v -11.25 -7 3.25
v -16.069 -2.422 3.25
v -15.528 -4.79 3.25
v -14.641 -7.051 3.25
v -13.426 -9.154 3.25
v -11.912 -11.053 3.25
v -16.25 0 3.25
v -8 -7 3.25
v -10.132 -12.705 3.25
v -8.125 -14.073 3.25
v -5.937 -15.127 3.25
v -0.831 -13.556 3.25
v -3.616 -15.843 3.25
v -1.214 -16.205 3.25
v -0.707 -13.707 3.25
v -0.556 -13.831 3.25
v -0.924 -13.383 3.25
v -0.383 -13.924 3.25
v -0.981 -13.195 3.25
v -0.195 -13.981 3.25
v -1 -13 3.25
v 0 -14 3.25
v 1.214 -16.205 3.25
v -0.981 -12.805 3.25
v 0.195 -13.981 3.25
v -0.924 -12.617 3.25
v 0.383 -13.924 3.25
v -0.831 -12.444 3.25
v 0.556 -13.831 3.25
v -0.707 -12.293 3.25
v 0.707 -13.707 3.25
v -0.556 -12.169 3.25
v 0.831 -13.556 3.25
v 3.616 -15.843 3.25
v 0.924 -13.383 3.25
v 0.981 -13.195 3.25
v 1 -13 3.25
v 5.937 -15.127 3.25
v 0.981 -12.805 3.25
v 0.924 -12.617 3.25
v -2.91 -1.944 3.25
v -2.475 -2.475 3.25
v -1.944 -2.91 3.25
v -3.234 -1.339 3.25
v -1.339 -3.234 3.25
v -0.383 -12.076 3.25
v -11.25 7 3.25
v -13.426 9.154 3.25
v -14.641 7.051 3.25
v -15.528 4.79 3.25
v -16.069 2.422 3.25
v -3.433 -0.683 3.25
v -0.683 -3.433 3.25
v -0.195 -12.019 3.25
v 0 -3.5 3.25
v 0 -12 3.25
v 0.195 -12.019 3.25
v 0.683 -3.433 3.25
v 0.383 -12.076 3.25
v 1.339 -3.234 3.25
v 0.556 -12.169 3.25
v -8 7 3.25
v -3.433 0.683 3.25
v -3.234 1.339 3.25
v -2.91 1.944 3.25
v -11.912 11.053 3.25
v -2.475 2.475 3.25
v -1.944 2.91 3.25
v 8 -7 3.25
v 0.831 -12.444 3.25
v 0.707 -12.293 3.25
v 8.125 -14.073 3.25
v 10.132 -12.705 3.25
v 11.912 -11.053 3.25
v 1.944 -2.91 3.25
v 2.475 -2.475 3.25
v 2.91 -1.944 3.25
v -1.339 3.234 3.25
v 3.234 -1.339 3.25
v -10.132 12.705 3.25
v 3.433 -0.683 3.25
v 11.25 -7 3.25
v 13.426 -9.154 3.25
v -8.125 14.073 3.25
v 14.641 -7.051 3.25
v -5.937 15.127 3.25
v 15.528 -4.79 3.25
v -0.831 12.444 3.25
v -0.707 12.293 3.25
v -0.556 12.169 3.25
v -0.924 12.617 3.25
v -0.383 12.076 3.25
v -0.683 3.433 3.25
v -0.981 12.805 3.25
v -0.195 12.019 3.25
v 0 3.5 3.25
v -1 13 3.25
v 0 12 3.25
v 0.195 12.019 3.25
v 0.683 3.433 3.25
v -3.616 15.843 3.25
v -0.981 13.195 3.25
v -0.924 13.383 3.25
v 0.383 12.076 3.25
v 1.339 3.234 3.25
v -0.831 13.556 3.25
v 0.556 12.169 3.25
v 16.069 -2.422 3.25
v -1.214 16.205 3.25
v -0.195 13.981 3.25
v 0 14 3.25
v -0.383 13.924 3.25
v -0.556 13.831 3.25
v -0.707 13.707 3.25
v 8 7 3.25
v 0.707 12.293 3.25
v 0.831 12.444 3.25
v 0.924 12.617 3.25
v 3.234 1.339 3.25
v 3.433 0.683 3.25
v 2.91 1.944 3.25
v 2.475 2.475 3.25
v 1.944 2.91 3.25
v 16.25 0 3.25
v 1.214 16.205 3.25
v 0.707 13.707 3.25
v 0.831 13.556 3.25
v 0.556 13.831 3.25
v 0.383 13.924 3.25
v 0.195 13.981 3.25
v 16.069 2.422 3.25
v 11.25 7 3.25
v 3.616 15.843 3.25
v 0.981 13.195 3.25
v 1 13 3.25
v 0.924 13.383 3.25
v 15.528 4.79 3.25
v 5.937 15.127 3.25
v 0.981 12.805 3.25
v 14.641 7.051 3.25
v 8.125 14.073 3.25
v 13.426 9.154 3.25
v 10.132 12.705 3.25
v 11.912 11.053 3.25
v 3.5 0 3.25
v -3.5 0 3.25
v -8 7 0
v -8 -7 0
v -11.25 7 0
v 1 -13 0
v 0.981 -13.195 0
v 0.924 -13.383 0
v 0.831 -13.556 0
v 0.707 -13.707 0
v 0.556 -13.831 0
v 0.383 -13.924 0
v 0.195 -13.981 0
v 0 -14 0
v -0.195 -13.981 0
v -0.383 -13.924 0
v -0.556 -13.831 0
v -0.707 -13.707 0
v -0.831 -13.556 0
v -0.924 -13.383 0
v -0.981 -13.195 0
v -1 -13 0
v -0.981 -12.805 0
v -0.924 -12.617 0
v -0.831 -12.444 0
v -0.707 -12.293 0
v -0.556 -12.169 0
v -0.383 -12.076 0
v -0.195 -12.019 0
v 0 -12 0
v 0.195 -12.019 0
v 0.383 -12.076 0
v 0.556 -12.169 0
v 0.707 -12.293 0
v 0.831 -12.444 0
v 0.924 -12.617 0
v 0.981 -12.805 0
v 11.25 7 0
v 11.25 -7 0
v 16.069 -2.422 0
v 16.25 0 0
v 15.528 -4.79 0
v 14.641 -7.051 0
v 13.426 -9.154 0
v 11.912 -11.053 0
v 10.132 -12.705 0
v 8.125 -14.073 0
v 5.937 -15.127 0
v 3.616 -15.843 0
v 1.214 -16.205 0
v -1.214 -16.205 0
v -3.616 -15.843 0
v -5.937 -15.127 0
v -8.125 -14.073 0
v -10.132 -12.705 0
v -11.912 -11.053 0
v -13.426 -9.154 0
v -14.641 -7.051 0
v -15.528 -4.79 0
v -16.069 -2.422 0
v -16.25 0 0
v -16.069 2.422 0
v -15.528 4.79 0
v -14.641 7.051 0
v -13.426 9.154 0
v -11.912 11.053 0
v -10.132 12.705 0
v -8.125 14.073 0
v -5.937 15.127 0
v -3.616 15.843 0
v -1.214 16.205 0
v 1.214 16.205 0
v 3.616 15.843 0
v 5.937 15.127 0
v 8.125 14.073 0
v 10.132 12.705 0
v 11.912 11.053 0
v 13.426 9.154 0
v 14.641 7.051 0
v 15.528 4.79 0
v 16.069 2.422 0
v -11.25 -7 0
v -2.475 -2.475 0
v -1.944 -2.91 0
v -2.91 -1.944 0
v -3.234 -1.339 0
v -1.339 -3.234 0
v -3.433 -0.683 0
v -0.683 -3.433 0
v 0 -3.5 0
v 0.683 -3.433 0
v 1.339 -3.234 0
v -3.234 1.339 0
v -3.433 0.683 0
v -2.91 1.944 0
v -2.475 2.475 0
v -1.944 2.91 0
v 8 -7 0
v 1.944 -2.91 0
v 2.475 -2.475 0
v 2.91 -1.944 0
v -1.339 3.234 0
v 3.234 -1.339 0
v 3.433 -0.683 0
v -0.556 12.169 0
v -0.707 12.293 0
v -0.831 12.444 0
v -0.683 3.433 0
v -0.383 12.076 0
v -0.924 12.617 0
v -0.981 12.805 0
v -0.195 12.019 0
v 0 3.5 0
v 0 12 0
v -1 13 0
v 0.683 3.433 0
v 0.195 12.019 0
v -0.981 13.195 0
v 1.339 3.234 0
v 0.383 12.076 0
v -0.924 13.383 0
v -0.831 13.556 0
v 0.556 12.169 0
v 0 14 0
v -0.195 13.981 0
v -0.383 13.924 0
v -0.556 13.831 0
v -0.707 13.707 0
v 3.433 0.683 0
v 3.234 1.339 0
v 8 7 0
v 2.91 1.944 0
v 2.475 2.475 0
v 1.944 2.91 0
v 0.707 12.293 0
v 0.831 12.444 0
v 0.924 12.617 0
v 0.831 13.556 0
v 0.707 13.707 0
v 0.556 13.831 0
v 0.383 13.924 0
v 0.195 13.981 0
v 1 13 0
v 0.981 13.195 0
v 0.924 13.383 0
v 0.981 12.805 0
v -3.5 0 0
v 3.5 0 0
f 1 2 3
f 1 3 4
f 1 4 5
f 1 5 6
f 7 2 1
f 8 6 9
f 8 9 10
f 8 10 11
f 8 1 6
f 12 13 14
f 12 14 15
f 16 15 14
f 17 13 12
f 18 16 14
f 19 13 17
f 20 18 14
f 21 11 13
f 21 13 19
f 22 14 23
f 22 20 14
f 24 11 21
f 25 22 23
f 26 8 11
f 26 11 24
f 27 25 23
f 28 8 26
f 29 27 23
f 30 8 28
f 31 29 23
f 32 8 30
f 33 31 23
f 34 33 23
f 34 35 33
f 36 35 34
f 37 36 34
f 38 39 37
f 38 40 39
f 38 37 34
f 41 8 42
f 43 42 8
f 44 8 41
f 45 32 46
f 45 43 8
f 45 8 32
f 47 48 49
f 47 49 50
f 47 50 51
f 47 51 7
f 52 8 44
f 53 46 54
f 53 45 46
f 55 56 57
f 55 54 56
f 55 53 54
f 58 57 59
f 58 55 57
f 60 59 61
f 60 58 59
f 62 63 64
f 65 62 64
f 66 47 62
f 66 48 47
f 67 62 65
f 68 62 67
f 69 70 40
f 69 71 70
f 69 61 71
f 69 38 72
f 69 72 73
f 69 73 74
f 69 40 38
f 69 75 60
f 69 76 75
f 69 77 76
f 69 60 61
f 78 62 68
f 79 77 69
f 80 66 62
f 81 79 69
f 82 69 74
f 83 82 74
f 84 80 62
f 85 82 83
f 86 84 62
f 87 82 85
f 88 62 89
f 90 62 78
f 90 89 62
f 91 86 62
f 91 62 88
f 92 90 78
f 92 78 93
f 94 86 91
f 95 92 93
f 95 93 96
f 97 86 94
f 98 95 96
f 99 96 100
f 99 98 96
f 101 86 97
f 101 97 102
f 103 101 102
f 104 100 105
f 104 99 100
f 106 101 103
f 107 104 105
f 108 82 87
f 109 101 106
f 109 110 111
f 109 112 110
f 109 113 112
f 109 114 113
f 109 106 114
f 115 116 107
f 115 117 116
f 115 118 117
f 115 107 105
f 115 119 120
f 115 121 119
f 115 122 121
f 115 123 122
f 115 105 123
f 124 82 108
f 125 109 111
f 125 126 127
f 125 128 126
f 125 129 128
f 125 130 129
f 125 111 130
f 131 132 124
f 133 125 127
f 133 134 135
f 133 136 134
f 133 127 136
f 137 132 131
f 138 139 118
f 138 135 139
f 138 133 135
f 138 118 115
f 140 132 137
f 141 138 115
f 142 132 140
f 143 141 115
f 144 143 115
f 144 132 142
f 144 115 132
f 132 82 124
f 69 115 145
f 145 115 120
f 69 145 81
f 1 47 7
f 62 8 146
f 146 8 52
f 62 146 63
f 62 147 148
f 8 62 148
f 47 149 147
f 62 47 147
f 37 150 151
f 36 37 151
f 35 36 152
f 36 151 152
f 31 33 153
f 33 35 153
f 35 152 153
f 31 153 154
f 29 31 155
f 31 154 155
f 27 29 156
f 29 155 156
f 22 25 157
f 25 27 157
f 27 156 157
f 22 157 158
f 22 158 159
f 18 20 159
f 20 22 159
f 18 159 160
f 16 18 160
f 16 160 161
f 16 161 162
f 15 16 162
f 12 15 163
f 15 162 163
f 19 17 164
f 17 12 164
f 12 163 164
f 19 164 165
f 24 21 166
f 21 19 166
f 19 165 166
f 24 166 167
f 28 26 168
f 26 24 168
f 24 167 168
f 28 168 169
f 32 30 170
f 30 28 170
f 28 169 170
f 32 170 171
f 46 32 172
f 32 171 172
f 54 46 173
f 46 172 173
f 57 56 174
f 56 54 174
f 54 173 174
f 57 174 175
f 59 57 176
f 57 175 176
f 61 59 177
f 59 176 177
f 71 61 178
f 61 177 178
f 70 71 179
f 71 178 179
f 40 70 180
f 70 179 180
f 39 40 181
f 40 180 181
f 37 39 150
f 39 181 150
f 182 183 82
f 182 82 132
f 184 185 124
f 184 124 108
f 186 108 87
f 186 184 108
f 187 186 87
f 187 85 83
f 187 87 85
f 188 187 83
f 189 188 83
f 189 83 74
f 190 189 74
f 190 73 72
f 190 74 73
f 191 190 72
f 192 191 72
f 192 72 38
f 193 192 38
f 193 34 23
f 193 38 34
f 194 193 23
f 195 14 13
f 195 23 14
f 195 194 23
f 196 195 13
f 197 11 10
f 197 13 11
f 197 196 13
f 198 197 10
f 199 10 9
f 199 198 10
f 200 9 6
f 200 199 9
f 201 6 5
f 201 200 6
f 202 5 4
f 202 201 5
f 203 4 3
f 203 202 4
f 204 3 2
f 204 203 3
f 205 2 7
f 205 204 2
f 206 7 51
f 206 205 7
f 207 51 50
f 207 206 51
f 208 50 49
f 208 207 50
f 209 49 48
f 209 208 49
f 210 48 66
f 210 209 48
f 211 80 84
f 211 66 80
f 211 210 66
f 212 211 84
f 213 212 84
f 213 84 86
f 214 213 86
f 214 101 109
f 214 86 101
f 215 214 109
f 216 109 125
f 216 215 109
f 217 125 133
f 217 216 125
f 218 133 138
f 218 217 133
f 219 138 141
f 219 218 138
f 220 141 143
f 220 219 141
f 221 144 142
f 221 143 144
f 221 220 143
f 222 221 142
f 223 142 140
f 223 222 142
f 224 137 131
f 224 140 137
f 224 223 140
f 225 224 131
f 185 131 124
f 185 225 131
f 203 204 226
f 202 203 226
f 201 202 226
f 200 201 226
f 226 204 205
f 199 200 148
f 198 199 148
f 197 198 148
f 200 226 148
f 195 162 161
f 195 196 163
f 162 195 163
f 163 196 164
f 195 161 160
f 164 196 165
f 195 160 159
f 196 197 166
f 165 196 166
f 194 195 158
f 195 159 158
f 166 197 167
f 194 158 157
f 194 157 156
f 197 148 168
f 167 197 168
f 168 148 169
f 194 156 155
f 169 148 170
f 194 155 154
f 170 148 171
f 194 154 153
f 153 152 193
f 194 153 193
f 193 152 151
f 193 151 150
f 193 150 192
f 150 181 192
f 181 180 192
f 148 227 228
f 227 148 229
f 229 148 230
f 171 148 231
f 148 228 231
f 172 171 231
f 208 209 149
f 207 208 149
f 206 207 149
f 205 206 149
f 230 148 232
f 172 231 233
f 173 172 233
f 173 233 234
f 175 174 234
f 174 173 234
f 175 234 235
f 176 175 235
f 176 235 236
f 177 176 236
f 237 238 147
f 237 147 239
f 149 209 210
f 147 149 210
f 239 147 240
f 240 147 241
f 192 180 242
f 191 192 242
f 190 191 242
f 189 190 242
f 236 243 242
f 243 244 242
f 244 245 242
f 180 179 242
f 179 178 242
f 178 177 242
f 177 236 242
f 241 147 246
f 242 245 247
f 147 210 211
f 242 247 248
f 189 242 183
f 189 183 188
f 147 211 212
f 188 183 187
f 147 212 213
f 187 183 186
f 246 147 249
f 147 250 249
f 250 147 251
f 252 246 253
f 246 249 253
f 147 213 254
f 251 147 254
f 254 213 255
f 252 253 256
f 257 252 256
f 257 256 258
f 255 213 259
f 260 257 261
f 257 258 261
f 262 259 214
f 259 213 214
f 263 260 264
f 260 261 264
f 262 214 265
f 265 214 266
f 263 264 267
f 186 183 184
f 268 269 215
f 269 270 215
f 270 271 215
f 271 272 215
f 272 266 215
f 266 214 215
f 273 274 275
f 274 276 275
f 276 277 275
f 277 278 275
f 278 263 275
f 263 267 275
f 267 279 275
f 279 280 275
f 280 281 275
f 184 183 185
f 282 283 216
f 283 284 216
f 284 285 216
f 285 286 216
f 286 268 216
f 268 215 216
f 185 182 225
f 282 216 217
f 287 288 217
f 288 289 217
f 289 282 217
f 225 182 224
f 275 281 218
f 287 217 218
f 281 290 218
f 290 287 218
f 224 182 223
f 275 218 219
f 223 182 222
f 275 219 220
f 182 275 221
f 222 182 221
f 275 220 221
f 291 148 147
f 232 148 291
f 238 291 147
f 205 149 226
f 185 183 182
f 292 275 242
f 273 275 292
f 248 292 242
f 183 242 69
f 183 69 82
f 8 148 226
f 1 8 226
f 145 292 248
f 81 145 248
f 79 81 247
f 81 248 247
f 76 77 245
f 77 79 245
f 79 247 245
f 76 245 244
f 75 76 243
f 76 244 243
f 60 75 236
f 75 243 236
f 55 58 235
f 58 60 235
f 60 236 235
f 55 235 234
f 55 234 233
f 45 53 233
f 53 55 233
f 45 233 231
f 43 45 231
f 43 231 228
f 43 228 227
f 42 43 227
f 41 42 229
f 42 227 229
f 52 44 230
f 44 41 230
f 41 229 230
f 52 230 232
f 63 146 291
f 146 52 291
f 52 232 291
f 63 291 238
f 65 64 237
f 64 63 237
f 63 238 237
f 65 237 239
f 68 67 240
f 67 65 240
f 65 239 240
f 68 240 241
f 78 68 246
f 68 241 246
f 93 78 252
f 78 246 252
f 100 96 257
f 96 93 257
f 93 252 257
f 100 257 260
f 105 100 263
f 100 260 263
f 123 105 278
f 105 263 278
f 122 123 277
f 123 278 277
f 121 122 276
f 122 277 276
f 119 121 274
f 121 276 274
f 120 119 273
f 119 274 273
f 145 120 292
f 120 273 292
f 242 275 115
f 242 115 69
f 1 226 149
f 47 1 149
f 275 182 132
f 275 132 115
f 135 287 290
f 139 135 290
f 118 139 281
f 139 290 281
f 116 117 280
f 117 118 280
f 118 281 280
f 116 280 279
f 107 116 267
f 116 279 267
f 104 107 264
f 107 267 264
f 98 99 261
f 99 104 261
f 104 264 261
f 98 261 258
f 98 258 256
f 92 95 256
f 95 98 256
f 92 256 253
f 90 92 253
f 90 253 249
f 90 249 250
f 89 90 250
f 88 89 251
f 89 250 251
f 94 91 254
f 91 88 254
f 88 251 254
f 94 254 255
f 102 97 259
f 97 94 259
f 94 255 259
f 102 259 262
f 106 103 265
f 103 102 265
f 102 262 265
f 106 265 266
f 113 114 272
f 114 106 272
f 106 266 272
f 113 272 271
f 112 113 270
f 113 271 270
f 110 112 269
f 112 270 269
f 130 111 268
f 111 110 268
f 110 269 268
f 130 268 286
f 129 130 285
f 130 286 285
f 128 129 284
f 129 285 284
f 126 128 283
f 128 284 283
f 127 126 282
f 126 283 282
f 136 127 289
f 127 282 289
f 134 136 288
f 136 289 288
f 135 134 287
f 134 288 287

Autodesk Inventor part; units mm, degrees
ref_plane "YZ Plane" through (0, 0, 0) normal (1, 0, 0) x (0, 1, 0)
ref_plane "XZ Plane" through (0, 0, 0) normal (0, 1, 0) x (-1, 0, 0)
ref_plane "XY Plane" through (0, 0, 0) normal (0, 0, 1) x (1, 0, 0)
sketch "Block1" plane through (0, 0, 0) normal (0, 0, 1) x (1, 0, 0)
  circle A0 centre (74.029, 24.2723) radius 1
  line L0 (49.279, 30.4723) -> (71.779, 30.4723)
  line L1 (71.779, 30.4723) -> (71.779, 18.0723)
  line L2 (71.779, 18.0723) -> (49.279, 18.0723)
  line L3 (49.279, 18.0723) -> (49.279, 30.4723)
  line L4 (49.279, 30.4723) -> (44.779, 30.4723)
  line L5 (44.779, 30.4723) -> (44.779, 18.0723)
  line L6 (44.779, 18.0723) -> (49.279, 18.0723)
  line L7 (49.279, 18.0723) -> (49.279, 30.4723)
  line L8 (71.779, 30.4723) -> (76.279, 30.4723)
  line L9 (76.279, 30.4723) -> (76.279, 18.0723)
  line L10 (76.279, 18.0723) -> (71.779, 18.0723)
  line L11 (71.779, 18.0723) -> (71.779, 30.4723)
  line L12 (44.779, 24.2723) -> (76.279, 24.2723) construction
  line L13 (47.029, 30.4723) -> (47.029, 18.0723) construction
  circle A1 centre (47.029, 24.2723) radius 1
  line L14 (74.029, 30.4723) -> (74.029, 18.0723) construction
  point P0 (60.979, 24.0984)
  dimension "d7" = 22.5
  dimension "d8" = 12.4
  dimension "d9" = 4.5
  dimension "d10" = 4.5
  dimension "d11" = 2
  dimension "d12" = 2
sketch "Sketch1" plane through (0, 0, 0) normal (0, 0, 1) x (1, 0, 0)
  line L0 (-92.7646, -8.503) -> (-89.7646, -8.503)
  line L1 (-89.7646, -8.503) -> (-89.7646, -11.753)
  line L2 (-89.7646, -11.753) -> (-92.7646, -11.753)
  line L3 (-92.7646, -11.753) -> (-92.7646, -8.503)
  line L4 (-92.7646, -21.6527) -> (-89.7646, -21.6527)
  line L5 (-89.7646, -21.6527) -> (-89.7646, -21.7527)
  line L6 (-89.7646, -21.7527) -> (-92.7646, -21.7527)
  line L7 (-92.7646, -21.7527) -> (-92.7646, -21.6527)
  circle A0 centre (0, 0) radius 16.25
  circle A1 centre (0, 13) radius 1
  line L8 (-16.25, 0) -> (16.25, 0) construction
  line L9 (0, 16.25) -> (0, -16.25) construction
  circle A2 centre (0, -13) radius 1
  circle A3 centre (0, 0) radius 3.5
  line L10 (-11.25, 7) -> (-8, 7)
  line L11 (-8, 7) -> (-8, -7)
  line L12 (-8, -7) -> (-11.25, -7)
  line L13 (-11.25, -7) -> (-11.25, 7)
  line L14 (-11.25, 0) -> (-8, 0) construction
  line L15 (11.25, 7) -> (8, 7)
  line L16 (8, 7) -> (8, -7)
  line L17 (8, -7) -> (11.25, -7)
  line L18 (11.25, -7) -> (11.25, 7)
  line L19 (11.25, 0) -> (8, 0) construction
  dimension "d0" = 3
  dimension "mat" = 3.25
  dimension "d2" = 3
  dimension "d3" = 0.1
  dimension "d23" = 32.5
  dimension "d24" = 2
  dimension "d25" = 12
  dimension "d28" = 7
  dimension "d29" = 3.25
  dimension "d30" = 14
  dimension "d31" = 5
extrude "Extrusion3" add sketch "Sketch1" along normal blind 3.25 contours A0
equation "\"d29\" = mat"
equation "\"d32\" = mat"
properties part number "arm-servo"
